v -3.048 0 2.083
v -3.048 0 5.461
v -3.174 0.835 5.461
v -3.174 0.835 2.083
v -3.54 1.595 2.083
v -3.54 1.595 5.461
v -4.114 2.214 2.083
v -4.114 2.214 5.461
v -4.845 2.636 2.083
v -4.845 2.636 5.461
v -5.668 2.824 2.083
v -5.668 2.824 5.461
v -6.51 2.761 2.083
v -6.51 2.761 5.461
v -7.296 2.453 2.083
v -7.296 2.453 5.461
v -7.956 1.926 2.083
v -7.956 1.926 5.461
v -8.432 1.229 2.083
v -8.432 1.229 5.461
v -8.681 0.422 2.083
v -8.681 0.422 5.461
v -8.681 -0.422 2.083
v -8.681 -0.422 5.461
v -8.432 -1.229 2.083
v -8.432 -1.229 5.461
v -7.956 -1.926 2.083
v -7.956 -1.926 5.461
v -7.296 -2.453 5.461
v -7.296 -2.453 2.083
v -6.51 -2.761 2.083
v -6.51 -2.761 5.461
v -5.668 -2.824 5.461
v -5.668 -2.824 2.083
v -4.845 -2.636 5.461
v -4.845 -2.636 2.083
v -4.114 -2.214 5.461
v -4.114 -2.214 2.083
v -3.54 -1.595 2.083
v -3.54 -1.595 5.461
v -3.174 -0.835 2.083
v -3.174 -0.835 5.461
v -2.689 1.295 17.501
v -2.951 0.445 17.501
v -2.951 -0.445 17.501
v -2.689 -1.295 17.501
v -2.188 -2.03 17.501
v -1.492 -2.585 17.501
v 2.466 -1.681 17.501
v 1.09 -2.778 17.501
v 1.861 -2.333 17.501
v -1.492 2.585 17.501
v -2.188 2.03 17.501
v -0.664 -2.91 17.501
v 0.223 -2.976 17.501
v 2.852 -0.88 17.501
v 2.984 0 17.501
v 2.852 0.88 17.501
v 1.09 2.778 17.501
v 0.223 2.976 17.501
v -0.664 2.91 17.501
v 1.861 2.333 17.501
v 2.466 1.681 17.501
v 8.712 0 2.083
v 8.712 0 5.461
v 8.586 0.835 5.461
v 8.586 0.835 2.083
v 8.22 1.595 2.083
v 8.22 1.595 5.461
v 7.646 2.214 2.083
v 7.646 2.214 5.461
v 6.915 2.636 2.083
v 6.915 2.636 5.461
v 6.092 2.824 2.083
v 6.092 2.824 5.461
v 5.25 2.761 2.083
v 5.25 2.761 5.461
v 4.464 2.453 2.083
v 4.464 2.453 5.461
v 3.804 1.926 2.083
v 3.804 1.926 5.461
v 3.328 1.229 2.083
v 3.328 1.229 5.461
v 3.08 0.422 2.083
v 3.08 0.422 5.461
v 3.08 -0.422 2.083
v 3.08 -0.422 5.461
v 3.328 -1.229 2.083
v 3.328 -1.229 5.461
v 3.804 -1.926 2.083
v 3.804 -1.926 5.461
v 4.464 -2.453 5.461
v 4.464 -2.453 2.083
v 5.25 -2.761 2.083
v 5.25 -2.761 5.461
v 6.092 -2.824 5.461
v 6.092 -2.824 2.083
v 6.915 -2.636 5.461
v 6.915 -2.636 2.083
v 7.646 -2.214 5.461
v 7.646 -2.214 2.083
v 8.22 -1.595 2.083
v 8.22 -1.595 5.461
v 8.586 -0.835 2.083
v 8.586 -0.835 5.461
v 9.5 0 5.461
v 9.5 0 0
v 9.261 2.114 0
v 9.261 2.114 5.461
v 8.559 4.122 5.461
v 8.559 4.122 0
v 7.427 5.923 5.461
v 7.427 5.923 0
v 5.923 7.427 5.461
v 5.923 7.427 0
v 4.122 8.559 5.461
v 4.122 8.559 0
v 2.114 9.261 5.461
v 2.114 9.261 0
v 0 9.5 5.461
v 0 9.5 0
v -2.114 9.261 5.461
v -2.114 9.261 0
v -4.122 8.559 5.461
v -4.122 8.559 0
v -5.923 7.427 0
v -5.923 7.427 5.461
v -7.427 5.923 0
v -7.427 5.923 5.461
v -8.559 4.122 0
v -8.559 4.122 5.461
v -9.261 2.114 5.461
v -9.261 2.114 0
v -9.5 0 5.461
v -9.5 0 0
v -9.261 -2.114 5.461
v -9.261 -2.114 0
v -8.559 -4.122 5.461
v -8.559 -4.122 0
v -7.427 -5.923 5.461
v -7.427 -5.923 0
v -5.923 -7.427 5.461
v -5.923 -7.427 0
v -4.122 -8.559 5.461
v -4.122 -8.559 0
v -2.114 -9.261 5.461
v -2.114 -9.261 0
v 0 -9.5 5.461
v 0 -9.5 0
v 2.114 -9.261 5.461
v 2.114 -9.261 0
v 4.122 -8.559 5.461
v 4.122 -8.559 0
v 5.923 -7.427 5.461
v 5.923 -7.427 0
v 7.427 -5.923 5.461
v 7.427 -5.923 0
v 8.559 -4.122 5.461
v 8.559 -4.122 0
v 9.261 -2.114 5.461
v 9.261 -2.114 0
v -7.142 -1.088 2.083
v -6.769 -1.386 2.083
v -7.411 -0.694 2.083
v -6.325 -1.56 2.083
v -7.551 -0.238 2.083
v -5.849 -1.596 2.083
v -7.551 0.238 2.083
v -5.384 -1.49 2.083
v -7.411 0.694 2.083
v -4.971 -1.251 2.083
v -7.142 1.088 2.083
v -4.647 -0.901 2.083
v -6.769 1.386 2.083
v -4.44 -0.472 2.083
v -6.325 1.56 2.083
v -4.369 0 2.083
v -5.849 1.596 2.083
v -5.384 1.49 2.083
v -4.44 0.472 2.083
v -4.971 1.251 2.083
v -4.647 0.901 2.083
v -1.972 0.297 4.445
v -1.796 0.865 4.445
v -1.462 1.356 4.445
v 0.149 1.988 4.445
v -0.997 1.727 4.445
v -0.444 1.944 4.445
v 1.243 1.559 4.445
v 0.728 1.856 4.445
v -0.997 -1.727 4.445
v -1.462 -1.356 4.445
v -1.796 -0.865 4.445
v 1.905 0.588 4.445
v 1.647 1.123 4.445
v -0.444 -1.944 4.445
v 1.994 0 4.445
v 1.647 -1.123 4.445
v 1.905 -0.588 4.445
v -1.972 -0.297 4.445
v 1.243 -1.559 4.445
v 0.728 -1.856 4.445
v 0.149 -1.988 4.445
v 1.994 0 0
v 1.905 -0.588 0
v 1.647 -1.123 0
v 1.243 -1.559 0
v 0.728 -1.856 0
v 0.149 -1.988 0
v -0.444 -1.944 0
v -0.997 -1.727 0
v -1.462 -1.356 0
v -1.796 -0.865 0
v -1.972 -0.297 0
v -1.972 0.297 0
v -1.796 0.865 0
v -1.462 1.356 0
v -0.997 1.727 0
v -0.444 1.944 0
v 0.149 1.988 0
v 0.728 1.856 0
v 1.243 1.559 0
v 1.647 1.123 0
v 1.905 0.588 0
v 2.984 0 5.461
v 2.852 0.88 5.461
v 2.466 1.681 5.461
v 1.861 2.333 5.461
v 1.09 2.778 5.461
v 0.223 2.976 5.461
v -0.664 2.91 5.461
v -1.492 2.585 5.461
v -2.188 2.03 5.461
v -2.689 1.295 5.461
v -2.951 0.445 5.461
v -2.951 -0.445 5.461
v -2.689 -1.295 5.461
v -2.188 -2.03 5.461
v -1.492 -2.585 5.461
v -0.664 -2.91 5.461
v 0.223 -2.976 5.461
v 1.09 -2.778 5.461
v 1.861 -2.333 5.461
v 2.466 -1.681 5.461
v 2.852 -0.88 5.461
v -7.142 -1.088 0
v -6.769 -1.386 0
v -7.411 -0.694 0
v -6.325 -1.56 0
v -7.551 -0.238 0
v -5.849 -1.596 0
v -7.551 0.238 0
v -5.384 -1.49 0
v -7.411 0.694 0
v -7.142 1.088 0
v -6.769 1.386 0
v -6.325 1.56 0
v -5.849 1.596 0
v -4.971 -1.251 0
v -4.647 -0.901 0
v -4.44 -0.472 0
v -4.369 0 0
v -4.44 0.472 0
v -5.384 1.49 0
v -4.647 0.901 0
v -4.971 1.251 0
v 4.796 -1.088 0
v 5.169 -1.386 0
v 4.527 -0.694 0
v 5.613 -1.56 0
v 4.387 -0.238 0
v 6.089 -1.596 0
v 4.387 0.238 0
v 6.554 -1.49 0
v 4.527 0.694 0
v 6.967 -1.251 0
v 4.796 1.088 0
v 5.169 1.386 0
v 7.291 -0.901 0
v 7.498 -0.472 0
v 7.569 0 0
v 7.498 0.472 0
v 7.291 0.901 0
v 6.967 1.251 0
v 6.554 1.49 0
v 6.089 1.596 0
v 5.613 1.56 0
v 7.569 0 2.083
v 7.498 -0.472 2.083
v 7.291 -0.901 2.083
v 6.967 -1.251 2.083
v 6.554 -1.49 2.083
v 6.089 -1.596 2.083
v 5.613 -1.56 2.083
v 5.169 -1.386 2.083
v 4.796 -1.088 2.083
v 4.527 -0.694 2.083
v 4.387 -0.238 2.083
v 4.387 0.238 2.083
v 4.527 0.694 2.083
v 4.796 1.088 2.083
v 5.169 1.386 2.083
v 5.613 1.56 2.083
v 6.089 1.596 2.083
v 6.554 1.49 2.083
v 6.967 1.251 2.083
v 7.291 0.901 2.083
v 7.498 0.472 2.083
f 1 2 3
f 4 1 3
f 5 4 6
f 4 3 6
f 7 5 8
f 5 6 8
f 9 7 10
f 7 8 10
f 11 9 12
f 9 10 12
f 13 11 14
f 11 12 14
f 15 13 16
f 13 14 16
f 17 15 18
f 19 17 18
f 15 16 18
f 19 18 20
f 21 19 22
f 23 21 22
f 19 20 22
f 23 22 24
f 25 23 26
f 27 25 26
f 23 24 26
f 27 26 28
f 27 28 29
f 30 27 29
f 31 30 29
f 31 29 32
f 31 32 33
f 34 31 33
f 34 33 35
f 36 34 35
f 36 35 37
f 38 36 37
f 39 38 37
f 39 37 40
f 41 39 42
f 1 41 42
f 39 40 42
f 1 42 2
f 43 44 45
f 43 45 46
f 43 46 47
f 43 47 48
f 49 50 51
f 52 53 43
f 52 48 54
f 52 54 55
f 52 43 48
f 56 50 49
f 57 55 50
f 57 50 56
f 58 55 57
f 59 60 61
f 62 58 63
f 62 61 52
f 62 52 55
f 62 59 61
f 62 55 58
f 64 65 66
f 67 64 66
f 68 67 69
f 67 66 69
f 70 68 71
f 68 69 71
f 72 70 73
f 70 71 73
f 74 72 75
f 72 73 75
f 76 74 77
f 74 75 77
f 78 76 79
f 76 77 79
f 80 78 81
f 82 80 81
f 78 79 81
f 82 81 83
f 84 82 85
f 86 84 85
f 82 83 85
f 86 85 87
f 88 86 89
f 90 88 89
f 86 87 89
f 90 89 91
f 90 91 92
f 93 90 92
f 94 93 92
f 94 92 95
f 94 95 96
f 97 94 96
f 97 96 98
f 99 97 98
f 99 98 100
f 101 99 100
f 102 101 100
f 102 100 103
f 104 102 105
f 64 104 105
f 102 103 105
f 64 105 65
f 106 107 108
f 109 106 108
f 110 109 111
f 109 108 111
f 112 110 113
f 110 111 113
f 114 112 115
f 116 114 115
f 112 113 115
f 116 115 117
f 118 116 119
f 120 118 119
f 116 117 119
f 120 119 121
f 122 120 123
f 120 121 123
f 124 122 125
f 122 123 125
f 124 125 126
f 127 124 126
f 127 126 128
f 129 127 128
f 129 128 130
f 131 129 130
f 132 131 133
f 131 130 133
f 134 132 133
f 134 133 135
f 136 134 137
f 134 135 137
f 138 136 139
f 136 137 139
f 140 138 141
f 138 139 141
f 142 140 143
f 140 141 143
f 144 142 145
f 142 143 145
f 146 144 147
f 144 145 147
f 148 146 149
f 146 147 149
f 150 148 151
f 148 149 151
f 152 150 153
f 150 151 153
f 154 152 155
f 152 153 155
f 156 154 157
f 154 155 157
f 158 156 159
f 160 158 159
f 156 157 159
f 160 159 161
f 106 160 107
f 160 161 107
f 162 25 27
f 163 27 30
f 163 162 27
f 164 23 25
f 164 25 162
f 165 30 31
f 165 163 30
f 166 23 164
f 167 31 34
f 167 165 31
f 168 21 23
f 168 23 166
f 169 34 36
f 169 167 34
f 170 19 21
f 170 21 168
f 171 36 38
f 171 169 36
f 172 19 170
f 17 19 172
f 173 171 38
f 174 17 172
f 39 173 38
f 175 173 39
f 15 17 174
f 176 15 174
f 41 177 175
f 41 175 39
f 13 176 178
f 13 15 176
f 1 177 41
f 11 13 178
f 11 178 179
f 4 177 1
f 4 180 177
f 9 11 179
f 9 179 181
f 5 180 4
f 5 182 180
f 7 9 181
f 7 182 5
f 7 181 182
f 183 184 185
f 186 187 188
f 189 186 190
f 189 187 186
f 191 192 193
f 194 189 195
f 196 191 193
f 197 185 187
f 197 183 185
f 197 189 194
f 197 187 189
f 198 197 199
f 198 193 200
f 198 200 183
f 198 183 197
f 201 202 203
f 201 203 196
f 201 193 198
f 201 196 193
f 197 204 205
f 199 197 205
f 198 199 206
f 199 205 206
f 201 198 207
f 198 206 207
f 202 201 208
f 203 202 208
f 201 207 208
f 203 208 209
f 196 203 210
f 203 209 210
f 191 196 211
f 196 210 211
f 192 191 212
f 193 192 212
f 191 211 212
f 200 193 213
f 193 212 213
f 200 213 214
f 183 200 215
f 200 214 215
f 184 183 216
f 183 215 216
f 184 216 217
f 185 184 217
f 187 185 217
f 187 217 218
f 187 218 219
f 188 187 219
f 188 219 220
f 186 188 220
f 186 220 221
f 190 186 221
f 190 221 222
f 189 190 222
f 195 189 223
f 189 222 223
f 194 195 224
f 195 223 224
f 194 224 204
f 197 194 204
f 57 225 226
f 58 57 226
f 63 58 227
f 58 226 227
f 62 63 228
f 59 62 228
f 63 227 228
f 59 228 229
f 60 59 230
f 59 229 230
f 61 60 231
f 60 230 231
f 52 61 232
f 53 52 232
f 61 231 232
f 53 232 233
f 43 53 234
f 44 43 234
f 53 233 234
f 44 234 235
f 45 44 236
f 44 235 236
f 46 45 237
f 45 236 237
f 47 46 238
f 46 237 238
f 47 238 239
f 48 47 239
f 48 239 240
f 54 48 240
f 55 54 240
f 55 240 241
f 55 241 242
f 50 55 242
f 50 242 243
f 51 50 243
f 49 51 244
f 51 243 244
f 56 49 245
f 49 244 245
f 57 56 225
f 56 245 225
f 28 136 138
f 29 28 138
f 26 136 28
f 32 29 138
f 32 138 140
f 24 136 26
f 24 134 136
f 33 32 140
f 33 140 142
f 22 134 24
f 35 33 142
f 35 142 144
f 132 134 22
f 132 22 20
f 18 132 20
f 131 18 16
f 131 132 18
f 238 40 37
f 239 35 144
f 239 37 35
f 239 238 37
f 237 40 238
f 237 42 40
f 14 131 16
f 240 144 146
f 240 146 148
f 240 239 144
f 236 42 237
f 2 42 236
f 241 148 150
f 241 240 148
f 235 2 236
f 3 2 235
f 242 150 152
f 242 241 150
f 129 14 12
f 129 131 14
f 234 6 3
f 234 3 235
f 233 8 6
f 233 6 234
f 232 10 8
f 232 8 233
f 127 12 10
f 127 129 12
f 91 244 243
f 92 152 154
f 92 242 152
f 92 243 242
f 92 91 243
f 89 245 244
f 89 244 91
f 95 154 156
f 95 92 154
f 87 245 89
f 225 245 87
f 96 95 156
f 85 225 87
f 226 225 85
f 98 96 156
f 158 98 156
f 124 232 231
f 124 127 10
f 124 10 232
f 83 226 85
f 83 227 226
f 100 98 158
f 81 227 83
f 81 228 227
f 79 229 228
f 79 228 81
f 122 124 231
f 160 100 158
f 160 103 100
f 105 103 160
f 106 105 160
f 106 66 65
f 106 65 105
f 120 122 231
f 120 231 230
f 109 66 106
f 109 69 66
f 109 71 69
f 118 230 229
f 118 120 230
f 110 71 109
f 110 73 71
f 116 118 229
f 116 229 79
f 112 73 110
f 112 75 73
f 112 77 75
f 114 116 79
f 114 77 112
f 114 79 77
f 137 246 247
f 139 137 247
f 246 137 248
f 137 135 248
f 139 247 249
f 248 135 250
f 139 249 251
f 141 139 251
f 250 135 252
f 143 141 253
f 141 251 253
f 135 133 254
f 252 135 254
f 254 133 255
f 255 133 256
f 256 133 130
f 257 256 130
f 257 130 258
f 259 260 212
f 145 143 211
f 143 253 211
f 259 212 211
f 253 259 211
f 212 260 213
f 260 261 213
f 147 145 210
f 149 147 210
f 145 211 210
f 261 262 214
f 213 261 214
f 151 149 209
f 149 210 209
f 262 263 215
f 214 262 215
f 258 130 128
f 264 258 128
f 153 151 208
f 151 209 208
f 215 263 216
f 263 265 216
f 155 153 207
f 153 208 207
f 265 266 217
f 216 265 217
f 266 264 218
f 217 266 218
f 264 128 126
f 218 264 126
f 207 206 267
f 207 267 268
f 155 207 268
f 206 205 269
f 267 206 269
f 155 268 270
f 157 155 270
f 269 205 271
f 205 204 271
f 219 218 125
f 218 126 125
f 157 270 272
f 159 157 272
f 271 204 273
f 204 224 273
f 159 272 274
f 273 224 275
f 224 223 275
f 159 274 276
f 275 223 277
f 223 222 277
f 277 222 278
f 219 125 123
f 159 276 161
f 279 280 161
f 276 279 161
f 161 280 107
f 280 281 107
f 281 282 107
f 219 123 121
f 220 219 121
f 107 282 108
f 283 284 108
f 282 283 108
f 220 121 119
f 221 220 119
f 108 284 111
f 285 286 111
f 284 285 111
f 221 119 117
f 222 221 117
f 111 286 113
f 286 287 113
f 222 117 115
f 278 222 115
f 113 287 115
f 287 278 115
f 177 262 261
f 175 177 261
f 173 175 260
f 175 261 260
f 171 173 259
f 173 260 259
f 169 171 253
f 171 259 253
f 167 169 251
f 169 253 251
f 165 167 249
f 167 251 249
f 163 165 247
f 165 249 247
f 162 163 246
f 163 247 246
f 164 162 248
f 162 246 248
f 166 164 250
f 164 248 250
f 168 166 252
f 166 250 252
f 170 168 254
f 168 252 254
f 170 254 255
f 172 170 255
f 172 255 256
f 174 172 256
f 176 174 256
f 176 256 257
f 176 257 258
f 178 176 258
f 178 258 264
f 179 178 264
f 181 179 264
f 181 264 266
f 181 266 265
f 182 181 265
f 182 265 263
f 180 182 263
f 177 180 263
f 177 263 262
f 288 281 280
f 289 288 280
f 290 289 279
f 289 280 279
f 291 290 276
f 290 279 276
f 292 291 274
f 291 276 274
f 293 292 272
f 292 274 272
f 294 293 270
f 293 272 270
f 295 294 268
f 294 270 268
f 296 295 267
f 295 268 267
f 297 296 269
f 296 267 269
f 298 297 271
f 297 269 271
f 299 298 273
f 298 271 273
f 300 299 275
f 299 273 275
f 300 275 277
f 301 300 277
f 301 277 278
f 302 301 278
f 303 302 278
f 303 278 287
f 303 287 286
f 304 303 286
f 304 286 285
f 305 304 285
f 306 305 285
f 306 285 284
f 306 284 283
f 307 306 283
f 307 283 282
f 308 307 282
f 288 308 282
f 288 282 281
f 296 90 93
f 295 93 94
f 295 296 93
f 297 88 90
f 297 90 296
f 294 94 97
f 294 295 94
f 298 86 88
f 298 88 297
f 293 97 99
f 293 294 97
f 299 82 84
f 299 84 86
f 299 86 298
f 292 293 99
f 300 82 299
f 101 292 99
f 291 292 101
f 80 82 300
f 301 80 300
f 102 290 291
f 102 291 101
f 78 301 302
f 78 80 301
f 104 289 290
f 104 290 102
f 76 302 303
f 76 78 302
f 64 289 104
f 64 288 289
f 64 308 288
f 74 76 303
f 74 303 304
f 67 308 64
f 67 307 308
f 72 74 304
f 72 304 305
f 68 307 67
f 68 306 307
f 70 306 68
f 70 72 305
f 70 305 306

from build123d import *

# Parameters (mm, degrees)
F0_R     = 9.4996
F1_DEPTH = 5.461
F2_R     = 2.9845
F3_DEPTH = 12.0396
F4_R     = 2.8321
F5_DEPTH = 3.3782
F6_R     = 1.9939
F7_DEPTH = 4.445
F8_R     = 1.6002
F9_DEPTH = 25.4


with BuildPart() as f1:
    # F0 (on Top) → F1 (new body)
    with BuildSketch(Plane.XY):
        Circle(F0_R)
    extrude(amount=F1_DEPTH)

    # F2 (on face) → F3 (join)
    with BuildSketch(Plane.XY.offset(5.461)):
        Circle(F2_R)
    extrude(amount=F3_DEPTH)

    # F4 (on face) → F5 (cut)
    with BuildSketch(Plane.XY.offset(5.461)):
        with Locations((-5.8801, 0)):
            Circle(F4_R)
        with Locations((5.8801, 0)):
            Circle(F4_R)
    extrude(amount=-F5_DEPTH, mode=Mode.SUBTRACT)

    # F6 (on face) → F7 (cut)
    with BuildSketch(Plane(origin=(0, 0, 0), x_dir=(1, 0, 0), z_dir=(0, 0, -1))):
        Circle(F6_R)
    extrude(amount=-F7_DEPTH, mode=Mode.SUBTRACT)

    # F8 (on face) → F9 (cut)
    with BuildSketch(Plane(origin=(0, 0, 0), x_dir=(1, 0, 0), z_dir=(0, 0, -1))):
        with Locations((5.969, 0)):
            Circle(F8_R)
        with Locations((-5.969, 0)):
            Circle(F8_R)
    extrude(amount=-F9_DEPTH, mode=Mode.SUBTRACT)


solid = f1.part
